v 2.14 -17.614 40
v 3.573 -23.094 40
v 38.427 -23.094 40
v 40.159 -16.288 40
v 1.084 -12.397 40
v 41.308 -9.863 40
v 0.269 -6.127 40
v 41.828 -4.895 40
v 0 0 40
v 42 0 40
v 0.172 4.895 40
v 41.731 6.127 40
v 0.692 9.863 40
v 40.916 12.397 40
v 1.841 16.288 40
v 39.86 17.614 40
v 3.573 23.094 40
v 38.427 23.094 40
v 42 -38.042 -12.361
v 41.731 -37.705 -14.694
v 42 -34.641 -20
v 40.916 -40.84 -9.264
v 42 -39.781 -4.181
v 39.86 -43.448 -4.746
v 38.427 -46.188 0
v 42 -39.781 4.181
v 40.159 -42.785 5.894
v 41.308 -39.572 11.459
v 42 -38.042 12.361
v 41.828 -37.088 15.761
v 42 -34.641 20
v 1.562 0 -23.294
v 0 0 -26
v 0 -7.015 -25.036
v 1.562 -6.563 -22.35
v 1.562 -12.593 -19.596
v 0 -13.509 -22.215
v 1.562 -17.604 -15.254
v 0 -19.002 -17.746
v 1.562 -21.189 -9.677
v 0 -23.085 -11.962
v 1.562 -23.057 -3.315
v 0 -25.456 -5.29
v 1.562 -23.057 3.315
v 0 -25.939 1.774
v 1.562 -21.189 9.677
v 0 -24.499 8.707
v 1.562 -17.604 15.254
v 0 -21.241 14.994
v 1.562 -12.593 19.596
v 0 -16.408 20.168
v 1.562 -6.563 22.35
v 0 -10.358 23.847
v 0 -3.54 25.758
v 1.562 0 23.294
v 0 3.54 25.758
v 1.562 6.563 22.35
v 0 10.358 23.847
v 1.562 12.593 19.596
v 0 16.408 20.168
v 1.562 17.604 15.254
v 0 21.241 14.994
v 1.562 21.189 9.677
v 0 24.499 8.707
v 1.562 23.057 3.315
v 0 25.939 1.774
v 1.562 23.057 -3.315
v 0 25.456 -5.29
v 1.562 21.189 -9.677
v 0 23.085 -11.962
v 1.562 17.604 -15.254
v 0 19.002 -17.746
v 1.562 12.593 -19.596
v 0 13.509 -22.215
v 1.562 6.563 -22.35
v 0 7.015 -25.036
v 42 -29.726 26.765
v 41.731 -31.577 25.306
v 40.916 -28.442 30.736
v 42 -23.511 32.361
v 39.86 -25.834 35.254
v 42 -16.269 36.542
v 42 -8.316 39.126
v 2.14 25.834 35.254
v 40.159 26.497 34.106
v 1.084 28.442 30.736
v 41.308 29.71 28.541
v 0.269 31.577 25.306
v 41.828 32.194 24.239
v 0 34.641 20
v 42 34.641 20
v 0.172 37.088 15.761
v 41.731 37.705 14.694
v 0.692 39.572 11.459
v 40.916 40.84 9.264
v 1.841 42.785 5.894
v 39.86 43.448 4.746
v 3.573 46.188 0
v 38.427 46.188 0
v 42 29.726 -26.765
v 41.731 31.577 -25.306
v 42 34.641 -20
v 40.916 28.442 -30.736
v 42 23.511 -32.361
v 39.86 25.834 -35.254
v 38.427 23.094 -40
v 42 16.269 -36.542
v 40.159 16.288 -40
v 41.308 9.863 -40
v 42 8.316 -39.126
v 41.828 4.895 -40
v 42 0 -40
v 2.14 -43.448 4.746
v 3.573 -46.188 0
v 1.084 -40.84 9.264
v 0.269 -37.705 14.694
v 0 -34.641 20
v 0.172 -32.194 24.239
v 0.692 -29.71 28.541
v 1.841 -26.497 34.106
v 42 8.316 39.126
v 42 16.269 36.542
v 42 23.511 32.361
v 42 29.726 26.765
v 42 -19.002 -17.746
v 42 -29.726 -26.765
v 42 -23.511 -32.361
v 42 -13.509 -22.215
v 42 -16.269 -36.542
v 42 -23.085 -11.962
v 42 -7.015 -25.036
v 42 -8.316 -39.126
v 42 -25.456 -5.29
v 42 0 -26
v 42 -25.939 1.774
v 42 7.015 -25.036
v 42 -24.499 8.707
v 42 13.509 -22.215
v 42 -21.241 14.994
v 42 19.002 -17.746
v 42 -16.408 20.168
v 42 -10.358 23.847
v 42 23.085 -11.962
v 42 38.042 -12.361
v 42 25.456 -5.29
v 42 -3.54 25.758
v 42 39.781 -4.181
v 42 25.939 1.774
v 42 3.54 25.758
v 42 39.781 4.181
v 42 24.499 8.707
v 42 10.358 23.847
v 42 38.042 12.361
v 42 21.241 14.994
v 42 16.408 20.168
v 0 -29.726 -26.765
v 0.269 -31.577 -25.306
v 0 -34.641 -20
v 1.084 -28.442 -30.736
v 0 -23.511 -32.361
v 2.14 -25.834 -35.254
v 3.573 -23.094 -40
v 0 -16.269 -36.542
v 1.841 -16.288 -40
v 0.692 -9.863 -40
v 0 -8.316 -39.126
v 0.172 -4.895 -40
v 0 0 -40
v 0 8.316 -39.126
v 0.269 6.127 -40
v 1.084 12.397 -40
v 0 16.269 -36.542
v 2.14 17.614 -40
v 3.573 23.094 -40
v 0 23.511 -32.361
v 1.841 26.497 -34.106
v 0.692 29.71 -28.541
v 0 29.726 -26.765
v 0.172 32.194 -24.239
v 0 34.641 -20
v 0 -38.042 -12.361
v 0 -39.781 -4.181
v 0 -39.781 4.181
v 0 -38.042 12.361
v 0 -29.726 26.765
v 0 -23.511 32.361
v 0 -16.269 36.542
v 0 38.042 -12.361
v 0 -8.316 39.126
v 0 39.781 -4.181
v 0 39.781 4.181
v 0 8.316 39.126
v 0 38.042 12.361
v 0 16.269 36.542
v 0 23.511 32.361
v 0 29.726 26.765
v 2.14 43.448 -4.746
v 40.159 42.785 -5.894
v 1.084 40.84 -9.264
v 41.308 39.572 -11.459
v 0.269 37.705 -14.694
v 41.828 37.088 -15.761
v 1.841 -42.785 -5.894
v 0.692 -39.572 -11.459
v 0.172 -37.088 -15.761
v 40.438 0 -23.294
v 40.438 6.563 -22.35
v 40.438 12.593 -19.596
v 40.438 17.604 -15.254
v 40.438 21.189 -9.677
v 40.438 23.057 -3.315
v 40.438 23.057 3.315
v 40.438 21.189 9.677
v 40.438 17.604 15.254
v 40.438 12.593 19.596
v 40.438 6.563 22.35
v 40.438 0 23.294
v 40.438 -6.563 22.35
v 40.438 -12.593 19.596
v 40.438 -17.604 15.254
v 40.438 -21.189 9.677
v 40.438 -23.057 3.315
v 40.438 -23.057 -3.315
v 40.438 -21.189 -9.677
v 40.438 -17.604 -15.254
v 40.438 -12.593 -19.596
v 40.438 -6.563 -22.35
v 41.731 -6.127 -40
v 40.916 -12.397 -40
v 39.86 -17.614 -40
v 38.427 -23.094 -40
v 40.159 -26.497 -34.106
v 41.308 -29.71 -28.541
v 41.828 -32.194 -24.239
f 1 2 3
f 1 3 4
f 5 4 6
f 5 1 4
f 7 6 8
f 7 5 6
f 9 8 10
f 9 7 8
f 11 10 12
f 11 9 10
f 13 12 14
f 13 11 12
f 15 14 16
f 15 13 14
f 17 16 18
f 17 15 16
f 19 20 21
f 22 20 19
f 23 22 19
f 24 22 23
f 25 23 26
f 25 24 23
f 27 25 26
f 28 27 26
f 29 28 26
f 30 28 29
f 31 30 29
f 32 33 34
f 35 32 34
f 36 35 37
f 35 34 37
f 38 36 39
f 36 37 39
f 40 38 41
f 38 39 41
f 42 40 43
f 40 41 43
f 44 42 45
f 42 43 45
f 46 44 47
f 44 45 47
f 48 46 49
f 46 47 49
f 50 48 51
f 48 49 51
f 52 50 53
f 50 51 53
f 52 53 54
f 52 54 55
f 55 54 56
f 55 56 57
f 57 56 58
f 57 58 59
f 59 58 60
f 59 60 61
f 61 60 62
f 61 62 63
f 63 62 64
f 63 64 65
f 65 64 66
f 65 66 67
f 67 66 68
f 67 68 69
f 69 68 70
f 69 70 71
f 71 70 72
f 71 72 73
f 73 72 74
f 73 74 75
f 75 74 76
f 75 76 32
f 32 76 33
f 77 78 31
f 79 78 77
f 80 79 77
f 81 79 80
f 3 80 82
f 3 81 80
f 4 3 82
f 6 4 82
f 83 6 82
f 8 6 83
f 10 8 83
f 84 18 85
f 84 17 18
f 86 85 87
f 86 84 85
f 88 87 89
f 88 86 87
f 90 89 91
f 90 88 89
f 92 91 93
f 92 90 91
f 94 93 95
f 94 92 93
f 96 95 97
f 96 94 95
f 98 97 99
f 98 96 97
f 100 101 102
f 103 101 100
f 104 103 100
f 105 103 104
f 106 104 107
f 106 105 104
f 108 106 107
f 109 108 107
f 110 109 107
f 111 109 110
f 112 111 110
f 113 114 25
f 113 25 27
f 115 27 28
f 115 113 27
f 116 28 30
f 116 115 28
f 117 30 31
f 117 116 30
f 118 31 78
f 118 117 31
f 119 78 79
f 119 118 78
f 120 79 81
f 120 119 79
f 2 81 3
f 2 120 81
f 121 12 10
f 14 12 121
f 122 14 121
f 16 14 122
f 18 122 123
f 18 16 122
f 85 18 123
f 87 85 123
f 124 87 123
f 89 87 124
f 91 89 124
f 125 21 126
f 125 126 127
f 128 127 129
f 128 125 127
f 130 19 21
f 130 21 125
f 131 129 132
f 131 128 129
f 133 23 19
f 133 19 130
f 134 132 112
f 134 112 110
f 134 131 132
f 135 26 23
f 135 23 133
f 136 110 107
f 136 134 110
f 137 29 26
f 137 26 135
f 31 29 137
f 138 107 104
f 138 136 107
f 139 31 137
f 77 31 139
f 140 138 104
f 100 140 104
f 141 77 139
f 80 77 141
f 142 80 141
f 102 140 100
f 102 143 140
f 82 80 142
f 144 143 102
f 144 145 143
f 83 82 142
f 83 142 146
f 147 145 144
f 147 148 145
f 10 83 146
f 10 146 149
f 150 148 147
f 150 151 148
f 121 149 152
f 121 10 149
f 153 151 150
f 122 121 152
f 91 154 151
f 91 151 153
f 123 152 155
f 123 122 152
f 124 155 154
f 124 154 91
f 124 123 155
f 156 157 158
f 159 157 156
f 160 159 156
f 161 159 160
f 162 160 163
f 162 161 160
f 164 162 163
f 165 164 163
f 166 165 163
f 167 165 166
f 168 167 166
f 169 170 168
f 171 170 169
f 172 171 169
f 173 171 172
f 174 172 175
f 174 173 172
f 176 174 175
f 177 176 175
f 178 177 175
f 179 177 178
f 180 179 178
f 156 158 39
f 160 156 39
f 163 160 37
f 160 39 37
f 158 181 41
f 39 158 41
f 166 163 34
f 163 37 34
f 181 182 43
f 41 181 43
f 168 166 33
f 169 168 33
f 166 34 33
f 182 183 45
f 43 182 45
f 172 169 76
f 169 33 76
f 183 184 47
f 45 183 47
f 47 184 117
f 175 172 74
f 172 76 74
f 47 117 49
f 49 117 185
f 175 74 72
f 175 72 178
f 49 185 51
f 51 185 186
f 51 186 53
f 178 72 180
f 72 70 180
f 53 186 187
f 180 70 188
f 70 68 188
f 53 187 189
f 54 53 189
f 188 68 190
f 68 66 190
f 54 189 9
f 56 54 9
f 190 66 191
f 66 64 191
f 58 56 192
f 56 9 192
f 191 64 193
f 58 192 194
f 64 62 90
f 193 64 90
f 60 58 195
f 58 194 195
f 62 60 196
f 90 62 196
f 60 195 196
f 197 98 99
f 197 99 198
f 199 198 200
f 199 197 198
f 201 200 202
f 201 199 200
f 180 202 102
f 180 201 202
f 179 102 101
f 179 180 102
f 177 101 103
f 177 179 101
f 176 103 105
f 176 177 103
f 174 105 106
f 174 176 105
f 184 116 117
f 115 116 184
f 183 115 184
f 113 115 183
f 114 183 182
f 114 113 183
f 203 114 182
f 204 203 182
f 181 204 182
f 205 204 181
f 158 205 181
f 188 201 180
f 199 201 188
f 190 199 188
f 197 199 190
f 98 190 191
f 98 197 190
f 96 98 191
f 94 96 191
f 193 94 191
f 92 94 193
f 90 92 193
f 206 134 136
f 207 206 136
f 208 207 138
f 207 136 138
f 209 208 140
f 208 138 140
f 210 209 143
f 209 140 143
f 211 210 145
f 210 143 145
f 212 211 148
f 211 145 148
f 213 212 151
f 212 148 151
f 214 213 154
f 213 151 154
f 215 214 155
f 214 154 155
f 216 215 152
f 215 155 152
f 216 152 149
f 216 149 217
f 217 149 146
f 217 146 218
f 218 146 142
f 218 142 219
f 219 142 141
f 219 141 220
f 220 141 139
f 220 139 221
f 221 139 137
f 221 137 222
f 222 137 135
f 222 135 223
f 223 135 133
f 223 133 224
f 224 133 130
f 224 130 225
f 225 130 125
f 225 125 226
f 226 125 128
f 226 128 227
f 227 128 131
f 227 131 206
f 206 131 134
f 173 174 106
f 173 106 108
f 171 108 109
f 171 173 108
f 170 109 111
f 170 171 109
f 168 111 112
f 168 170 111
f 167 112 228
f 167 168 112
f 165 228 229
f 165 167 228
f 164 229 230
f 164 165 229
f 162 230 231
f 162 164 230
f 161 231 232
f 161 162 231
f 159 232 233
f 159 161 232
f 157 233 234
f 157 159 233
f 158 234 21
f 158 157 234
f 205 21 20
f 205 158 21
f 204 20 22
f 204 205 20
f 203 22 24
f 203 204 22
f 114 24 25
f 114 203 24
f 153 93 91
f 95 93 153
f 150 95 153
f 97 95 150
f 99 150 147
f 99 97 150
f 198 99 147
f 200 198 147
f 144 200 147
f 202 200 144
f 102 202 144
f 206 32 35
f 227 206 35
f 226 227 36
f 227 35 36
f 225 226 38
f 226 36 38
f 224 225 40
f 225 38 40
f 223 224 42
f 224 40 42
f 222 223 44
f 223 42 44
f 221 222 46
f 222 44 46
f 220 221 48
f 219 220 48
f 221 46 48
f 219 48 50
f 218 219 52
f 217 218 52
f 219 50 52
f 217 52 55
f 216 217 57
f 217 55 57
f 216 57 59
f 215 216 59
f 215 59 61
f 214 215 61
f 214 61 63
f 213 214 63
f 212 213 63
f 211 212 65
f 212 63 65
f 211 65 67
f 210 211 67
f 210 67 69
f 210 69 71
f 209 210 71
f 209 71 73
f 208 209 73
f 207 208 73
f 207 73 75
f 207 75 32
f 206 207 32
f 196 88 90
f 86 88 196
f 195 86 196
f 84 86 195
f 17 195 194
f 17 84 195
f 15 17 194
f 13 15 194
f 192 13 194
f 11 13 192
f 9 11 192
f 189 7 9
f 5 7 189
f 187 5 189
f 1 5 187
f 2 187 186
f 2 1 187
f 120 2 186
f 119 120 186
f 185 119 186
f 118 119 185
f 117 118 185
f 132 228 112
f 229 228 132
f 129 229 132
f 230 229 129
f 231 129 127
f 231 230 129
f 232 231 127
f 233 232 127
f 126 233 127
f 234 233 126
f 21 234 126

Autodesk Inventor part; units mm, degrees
ref_plane "YZ Plane" through (0, 0, 0) normal (1, 0, 0) x (0, 1, 0)
ref_plane "XZ Plane" through (0, 0, 0) normal (0, 1, 0) x (-1, 0, 0)
sketch "Sketch1" plane through (0, 0, 0) normal (1, 0, 0) x (0, 1, 0)
  line L0 (-46.188, 0) -> (-23.094, 40)
  line L1 (-23.094, 40) -> (23.094, 40)
  line L2 (23.094, 40) -> (46.188, 0)
  line L3 (46.188, 0) -> (23.094, -40)
  line L4 (23.094, -40) -> (-23.094, -40)
  line L5 (-23.094, -40) -> (-46.188, 0)
  point P0 (0, 0)
  point P1 (0, 0)
  dimension "d0" = 92.376
extrude "Body" add sketch "Sketch1" along normal blind 42
sketch "Sketch2" plane through (0, 0, 0) normal (0, 0, 1) x (1, 0, 0)
  line L0 (0, 23.094) -> (0, 46.188) projected
  line L1 (0, 46.188) -> (42, 46.188) projected
  line L2 (42, 23.094) -> (42, 46.188) projected
  line L3 (-8.4, 0) -> (50.4, 0) projected
  line L4 (3.5727, 46.188) -> (0, 40)
  line L5 (38.4273, 46.188) -> (42, 40)
  dimension "d3" = 30
  dimension "d4" = 30
  dimension "d5" = 80
  dimension "d6" = 80
revolve "Chamfer1" cut sketch "Sketch2" angle 360 about axis through (-10, 0, 0) along (1, 0, 0)
sketch "Sketch3" plane through (42, 0, 0) normal (1, 0, 0) x (0, 0, -1)
  arc A0 (-20, -34.641) -> (20, -34.641) centre (0, 0) ccw projected
hole "Thread" at (42, 0, 0) direction (-1, 0, 0) diameter 46.5873 end through all thread size "M52x5" class "6H" standard "ISO Metric profile"
chamfer "Chamfer2" distance 2.7063 angle 30 1 edges at (42, 0, 23.2937) measured on face at (42, -34.2285, -0.9359)
chamfer "Chamfer3" distance 2.7063 angle 30 1 edges at (0, 0, 23.2937) measured on face at (0, -34.2285, -0.9359)
ref_plane "Work Plane1" through (-87.2182, 0, 0) normal (0, -0.8660254, -0.5) x (1, 0, 0)
equation "\"d0\" = 1.1547 * SW"
equation "\"d1\" = KOH"
equation "\"d8\" = -0.5 * GD1 + 0.5 * NND"
equation "\"d40\" = -0.5 * GD1 + 0.5 * NND"
equation "\"d10\" = -0.5 * GD1 + 0.5 * NND"
equation "\"d41\" = -0.5 * GD1 + 0.5 * NND"
equation "\"d3\" = ANG1"
equation "\"d4\" = ANG2"
equation "\"d5\" = SW0"
equation "\"d6\" = SW01"
equation "\"ANG1\" = 30deg"
equation "\"ANG2\" = ANG1"
equation "\"NND\" = 52"
equation "\"KOH\" = 42"
equation "\"SW0\" = SW"
equation "\"SW01\" = SW"
equation "\"GUL\" = 0.541266 * PTC"
equation "\"THREADDIA\" = 52"
equation "\"TOA\" = 30deg"
equation "\"PTC\" = 5"
equation "\"E0\" = 1.155 * SW"
equation "\"GAL\" = 0.541266 * PTC"
equation "\"SW\" = 80"
equation "\"GD1\" = 46.587341"
properties part number "BS 3692 - M52" material "Steel, Mild"
